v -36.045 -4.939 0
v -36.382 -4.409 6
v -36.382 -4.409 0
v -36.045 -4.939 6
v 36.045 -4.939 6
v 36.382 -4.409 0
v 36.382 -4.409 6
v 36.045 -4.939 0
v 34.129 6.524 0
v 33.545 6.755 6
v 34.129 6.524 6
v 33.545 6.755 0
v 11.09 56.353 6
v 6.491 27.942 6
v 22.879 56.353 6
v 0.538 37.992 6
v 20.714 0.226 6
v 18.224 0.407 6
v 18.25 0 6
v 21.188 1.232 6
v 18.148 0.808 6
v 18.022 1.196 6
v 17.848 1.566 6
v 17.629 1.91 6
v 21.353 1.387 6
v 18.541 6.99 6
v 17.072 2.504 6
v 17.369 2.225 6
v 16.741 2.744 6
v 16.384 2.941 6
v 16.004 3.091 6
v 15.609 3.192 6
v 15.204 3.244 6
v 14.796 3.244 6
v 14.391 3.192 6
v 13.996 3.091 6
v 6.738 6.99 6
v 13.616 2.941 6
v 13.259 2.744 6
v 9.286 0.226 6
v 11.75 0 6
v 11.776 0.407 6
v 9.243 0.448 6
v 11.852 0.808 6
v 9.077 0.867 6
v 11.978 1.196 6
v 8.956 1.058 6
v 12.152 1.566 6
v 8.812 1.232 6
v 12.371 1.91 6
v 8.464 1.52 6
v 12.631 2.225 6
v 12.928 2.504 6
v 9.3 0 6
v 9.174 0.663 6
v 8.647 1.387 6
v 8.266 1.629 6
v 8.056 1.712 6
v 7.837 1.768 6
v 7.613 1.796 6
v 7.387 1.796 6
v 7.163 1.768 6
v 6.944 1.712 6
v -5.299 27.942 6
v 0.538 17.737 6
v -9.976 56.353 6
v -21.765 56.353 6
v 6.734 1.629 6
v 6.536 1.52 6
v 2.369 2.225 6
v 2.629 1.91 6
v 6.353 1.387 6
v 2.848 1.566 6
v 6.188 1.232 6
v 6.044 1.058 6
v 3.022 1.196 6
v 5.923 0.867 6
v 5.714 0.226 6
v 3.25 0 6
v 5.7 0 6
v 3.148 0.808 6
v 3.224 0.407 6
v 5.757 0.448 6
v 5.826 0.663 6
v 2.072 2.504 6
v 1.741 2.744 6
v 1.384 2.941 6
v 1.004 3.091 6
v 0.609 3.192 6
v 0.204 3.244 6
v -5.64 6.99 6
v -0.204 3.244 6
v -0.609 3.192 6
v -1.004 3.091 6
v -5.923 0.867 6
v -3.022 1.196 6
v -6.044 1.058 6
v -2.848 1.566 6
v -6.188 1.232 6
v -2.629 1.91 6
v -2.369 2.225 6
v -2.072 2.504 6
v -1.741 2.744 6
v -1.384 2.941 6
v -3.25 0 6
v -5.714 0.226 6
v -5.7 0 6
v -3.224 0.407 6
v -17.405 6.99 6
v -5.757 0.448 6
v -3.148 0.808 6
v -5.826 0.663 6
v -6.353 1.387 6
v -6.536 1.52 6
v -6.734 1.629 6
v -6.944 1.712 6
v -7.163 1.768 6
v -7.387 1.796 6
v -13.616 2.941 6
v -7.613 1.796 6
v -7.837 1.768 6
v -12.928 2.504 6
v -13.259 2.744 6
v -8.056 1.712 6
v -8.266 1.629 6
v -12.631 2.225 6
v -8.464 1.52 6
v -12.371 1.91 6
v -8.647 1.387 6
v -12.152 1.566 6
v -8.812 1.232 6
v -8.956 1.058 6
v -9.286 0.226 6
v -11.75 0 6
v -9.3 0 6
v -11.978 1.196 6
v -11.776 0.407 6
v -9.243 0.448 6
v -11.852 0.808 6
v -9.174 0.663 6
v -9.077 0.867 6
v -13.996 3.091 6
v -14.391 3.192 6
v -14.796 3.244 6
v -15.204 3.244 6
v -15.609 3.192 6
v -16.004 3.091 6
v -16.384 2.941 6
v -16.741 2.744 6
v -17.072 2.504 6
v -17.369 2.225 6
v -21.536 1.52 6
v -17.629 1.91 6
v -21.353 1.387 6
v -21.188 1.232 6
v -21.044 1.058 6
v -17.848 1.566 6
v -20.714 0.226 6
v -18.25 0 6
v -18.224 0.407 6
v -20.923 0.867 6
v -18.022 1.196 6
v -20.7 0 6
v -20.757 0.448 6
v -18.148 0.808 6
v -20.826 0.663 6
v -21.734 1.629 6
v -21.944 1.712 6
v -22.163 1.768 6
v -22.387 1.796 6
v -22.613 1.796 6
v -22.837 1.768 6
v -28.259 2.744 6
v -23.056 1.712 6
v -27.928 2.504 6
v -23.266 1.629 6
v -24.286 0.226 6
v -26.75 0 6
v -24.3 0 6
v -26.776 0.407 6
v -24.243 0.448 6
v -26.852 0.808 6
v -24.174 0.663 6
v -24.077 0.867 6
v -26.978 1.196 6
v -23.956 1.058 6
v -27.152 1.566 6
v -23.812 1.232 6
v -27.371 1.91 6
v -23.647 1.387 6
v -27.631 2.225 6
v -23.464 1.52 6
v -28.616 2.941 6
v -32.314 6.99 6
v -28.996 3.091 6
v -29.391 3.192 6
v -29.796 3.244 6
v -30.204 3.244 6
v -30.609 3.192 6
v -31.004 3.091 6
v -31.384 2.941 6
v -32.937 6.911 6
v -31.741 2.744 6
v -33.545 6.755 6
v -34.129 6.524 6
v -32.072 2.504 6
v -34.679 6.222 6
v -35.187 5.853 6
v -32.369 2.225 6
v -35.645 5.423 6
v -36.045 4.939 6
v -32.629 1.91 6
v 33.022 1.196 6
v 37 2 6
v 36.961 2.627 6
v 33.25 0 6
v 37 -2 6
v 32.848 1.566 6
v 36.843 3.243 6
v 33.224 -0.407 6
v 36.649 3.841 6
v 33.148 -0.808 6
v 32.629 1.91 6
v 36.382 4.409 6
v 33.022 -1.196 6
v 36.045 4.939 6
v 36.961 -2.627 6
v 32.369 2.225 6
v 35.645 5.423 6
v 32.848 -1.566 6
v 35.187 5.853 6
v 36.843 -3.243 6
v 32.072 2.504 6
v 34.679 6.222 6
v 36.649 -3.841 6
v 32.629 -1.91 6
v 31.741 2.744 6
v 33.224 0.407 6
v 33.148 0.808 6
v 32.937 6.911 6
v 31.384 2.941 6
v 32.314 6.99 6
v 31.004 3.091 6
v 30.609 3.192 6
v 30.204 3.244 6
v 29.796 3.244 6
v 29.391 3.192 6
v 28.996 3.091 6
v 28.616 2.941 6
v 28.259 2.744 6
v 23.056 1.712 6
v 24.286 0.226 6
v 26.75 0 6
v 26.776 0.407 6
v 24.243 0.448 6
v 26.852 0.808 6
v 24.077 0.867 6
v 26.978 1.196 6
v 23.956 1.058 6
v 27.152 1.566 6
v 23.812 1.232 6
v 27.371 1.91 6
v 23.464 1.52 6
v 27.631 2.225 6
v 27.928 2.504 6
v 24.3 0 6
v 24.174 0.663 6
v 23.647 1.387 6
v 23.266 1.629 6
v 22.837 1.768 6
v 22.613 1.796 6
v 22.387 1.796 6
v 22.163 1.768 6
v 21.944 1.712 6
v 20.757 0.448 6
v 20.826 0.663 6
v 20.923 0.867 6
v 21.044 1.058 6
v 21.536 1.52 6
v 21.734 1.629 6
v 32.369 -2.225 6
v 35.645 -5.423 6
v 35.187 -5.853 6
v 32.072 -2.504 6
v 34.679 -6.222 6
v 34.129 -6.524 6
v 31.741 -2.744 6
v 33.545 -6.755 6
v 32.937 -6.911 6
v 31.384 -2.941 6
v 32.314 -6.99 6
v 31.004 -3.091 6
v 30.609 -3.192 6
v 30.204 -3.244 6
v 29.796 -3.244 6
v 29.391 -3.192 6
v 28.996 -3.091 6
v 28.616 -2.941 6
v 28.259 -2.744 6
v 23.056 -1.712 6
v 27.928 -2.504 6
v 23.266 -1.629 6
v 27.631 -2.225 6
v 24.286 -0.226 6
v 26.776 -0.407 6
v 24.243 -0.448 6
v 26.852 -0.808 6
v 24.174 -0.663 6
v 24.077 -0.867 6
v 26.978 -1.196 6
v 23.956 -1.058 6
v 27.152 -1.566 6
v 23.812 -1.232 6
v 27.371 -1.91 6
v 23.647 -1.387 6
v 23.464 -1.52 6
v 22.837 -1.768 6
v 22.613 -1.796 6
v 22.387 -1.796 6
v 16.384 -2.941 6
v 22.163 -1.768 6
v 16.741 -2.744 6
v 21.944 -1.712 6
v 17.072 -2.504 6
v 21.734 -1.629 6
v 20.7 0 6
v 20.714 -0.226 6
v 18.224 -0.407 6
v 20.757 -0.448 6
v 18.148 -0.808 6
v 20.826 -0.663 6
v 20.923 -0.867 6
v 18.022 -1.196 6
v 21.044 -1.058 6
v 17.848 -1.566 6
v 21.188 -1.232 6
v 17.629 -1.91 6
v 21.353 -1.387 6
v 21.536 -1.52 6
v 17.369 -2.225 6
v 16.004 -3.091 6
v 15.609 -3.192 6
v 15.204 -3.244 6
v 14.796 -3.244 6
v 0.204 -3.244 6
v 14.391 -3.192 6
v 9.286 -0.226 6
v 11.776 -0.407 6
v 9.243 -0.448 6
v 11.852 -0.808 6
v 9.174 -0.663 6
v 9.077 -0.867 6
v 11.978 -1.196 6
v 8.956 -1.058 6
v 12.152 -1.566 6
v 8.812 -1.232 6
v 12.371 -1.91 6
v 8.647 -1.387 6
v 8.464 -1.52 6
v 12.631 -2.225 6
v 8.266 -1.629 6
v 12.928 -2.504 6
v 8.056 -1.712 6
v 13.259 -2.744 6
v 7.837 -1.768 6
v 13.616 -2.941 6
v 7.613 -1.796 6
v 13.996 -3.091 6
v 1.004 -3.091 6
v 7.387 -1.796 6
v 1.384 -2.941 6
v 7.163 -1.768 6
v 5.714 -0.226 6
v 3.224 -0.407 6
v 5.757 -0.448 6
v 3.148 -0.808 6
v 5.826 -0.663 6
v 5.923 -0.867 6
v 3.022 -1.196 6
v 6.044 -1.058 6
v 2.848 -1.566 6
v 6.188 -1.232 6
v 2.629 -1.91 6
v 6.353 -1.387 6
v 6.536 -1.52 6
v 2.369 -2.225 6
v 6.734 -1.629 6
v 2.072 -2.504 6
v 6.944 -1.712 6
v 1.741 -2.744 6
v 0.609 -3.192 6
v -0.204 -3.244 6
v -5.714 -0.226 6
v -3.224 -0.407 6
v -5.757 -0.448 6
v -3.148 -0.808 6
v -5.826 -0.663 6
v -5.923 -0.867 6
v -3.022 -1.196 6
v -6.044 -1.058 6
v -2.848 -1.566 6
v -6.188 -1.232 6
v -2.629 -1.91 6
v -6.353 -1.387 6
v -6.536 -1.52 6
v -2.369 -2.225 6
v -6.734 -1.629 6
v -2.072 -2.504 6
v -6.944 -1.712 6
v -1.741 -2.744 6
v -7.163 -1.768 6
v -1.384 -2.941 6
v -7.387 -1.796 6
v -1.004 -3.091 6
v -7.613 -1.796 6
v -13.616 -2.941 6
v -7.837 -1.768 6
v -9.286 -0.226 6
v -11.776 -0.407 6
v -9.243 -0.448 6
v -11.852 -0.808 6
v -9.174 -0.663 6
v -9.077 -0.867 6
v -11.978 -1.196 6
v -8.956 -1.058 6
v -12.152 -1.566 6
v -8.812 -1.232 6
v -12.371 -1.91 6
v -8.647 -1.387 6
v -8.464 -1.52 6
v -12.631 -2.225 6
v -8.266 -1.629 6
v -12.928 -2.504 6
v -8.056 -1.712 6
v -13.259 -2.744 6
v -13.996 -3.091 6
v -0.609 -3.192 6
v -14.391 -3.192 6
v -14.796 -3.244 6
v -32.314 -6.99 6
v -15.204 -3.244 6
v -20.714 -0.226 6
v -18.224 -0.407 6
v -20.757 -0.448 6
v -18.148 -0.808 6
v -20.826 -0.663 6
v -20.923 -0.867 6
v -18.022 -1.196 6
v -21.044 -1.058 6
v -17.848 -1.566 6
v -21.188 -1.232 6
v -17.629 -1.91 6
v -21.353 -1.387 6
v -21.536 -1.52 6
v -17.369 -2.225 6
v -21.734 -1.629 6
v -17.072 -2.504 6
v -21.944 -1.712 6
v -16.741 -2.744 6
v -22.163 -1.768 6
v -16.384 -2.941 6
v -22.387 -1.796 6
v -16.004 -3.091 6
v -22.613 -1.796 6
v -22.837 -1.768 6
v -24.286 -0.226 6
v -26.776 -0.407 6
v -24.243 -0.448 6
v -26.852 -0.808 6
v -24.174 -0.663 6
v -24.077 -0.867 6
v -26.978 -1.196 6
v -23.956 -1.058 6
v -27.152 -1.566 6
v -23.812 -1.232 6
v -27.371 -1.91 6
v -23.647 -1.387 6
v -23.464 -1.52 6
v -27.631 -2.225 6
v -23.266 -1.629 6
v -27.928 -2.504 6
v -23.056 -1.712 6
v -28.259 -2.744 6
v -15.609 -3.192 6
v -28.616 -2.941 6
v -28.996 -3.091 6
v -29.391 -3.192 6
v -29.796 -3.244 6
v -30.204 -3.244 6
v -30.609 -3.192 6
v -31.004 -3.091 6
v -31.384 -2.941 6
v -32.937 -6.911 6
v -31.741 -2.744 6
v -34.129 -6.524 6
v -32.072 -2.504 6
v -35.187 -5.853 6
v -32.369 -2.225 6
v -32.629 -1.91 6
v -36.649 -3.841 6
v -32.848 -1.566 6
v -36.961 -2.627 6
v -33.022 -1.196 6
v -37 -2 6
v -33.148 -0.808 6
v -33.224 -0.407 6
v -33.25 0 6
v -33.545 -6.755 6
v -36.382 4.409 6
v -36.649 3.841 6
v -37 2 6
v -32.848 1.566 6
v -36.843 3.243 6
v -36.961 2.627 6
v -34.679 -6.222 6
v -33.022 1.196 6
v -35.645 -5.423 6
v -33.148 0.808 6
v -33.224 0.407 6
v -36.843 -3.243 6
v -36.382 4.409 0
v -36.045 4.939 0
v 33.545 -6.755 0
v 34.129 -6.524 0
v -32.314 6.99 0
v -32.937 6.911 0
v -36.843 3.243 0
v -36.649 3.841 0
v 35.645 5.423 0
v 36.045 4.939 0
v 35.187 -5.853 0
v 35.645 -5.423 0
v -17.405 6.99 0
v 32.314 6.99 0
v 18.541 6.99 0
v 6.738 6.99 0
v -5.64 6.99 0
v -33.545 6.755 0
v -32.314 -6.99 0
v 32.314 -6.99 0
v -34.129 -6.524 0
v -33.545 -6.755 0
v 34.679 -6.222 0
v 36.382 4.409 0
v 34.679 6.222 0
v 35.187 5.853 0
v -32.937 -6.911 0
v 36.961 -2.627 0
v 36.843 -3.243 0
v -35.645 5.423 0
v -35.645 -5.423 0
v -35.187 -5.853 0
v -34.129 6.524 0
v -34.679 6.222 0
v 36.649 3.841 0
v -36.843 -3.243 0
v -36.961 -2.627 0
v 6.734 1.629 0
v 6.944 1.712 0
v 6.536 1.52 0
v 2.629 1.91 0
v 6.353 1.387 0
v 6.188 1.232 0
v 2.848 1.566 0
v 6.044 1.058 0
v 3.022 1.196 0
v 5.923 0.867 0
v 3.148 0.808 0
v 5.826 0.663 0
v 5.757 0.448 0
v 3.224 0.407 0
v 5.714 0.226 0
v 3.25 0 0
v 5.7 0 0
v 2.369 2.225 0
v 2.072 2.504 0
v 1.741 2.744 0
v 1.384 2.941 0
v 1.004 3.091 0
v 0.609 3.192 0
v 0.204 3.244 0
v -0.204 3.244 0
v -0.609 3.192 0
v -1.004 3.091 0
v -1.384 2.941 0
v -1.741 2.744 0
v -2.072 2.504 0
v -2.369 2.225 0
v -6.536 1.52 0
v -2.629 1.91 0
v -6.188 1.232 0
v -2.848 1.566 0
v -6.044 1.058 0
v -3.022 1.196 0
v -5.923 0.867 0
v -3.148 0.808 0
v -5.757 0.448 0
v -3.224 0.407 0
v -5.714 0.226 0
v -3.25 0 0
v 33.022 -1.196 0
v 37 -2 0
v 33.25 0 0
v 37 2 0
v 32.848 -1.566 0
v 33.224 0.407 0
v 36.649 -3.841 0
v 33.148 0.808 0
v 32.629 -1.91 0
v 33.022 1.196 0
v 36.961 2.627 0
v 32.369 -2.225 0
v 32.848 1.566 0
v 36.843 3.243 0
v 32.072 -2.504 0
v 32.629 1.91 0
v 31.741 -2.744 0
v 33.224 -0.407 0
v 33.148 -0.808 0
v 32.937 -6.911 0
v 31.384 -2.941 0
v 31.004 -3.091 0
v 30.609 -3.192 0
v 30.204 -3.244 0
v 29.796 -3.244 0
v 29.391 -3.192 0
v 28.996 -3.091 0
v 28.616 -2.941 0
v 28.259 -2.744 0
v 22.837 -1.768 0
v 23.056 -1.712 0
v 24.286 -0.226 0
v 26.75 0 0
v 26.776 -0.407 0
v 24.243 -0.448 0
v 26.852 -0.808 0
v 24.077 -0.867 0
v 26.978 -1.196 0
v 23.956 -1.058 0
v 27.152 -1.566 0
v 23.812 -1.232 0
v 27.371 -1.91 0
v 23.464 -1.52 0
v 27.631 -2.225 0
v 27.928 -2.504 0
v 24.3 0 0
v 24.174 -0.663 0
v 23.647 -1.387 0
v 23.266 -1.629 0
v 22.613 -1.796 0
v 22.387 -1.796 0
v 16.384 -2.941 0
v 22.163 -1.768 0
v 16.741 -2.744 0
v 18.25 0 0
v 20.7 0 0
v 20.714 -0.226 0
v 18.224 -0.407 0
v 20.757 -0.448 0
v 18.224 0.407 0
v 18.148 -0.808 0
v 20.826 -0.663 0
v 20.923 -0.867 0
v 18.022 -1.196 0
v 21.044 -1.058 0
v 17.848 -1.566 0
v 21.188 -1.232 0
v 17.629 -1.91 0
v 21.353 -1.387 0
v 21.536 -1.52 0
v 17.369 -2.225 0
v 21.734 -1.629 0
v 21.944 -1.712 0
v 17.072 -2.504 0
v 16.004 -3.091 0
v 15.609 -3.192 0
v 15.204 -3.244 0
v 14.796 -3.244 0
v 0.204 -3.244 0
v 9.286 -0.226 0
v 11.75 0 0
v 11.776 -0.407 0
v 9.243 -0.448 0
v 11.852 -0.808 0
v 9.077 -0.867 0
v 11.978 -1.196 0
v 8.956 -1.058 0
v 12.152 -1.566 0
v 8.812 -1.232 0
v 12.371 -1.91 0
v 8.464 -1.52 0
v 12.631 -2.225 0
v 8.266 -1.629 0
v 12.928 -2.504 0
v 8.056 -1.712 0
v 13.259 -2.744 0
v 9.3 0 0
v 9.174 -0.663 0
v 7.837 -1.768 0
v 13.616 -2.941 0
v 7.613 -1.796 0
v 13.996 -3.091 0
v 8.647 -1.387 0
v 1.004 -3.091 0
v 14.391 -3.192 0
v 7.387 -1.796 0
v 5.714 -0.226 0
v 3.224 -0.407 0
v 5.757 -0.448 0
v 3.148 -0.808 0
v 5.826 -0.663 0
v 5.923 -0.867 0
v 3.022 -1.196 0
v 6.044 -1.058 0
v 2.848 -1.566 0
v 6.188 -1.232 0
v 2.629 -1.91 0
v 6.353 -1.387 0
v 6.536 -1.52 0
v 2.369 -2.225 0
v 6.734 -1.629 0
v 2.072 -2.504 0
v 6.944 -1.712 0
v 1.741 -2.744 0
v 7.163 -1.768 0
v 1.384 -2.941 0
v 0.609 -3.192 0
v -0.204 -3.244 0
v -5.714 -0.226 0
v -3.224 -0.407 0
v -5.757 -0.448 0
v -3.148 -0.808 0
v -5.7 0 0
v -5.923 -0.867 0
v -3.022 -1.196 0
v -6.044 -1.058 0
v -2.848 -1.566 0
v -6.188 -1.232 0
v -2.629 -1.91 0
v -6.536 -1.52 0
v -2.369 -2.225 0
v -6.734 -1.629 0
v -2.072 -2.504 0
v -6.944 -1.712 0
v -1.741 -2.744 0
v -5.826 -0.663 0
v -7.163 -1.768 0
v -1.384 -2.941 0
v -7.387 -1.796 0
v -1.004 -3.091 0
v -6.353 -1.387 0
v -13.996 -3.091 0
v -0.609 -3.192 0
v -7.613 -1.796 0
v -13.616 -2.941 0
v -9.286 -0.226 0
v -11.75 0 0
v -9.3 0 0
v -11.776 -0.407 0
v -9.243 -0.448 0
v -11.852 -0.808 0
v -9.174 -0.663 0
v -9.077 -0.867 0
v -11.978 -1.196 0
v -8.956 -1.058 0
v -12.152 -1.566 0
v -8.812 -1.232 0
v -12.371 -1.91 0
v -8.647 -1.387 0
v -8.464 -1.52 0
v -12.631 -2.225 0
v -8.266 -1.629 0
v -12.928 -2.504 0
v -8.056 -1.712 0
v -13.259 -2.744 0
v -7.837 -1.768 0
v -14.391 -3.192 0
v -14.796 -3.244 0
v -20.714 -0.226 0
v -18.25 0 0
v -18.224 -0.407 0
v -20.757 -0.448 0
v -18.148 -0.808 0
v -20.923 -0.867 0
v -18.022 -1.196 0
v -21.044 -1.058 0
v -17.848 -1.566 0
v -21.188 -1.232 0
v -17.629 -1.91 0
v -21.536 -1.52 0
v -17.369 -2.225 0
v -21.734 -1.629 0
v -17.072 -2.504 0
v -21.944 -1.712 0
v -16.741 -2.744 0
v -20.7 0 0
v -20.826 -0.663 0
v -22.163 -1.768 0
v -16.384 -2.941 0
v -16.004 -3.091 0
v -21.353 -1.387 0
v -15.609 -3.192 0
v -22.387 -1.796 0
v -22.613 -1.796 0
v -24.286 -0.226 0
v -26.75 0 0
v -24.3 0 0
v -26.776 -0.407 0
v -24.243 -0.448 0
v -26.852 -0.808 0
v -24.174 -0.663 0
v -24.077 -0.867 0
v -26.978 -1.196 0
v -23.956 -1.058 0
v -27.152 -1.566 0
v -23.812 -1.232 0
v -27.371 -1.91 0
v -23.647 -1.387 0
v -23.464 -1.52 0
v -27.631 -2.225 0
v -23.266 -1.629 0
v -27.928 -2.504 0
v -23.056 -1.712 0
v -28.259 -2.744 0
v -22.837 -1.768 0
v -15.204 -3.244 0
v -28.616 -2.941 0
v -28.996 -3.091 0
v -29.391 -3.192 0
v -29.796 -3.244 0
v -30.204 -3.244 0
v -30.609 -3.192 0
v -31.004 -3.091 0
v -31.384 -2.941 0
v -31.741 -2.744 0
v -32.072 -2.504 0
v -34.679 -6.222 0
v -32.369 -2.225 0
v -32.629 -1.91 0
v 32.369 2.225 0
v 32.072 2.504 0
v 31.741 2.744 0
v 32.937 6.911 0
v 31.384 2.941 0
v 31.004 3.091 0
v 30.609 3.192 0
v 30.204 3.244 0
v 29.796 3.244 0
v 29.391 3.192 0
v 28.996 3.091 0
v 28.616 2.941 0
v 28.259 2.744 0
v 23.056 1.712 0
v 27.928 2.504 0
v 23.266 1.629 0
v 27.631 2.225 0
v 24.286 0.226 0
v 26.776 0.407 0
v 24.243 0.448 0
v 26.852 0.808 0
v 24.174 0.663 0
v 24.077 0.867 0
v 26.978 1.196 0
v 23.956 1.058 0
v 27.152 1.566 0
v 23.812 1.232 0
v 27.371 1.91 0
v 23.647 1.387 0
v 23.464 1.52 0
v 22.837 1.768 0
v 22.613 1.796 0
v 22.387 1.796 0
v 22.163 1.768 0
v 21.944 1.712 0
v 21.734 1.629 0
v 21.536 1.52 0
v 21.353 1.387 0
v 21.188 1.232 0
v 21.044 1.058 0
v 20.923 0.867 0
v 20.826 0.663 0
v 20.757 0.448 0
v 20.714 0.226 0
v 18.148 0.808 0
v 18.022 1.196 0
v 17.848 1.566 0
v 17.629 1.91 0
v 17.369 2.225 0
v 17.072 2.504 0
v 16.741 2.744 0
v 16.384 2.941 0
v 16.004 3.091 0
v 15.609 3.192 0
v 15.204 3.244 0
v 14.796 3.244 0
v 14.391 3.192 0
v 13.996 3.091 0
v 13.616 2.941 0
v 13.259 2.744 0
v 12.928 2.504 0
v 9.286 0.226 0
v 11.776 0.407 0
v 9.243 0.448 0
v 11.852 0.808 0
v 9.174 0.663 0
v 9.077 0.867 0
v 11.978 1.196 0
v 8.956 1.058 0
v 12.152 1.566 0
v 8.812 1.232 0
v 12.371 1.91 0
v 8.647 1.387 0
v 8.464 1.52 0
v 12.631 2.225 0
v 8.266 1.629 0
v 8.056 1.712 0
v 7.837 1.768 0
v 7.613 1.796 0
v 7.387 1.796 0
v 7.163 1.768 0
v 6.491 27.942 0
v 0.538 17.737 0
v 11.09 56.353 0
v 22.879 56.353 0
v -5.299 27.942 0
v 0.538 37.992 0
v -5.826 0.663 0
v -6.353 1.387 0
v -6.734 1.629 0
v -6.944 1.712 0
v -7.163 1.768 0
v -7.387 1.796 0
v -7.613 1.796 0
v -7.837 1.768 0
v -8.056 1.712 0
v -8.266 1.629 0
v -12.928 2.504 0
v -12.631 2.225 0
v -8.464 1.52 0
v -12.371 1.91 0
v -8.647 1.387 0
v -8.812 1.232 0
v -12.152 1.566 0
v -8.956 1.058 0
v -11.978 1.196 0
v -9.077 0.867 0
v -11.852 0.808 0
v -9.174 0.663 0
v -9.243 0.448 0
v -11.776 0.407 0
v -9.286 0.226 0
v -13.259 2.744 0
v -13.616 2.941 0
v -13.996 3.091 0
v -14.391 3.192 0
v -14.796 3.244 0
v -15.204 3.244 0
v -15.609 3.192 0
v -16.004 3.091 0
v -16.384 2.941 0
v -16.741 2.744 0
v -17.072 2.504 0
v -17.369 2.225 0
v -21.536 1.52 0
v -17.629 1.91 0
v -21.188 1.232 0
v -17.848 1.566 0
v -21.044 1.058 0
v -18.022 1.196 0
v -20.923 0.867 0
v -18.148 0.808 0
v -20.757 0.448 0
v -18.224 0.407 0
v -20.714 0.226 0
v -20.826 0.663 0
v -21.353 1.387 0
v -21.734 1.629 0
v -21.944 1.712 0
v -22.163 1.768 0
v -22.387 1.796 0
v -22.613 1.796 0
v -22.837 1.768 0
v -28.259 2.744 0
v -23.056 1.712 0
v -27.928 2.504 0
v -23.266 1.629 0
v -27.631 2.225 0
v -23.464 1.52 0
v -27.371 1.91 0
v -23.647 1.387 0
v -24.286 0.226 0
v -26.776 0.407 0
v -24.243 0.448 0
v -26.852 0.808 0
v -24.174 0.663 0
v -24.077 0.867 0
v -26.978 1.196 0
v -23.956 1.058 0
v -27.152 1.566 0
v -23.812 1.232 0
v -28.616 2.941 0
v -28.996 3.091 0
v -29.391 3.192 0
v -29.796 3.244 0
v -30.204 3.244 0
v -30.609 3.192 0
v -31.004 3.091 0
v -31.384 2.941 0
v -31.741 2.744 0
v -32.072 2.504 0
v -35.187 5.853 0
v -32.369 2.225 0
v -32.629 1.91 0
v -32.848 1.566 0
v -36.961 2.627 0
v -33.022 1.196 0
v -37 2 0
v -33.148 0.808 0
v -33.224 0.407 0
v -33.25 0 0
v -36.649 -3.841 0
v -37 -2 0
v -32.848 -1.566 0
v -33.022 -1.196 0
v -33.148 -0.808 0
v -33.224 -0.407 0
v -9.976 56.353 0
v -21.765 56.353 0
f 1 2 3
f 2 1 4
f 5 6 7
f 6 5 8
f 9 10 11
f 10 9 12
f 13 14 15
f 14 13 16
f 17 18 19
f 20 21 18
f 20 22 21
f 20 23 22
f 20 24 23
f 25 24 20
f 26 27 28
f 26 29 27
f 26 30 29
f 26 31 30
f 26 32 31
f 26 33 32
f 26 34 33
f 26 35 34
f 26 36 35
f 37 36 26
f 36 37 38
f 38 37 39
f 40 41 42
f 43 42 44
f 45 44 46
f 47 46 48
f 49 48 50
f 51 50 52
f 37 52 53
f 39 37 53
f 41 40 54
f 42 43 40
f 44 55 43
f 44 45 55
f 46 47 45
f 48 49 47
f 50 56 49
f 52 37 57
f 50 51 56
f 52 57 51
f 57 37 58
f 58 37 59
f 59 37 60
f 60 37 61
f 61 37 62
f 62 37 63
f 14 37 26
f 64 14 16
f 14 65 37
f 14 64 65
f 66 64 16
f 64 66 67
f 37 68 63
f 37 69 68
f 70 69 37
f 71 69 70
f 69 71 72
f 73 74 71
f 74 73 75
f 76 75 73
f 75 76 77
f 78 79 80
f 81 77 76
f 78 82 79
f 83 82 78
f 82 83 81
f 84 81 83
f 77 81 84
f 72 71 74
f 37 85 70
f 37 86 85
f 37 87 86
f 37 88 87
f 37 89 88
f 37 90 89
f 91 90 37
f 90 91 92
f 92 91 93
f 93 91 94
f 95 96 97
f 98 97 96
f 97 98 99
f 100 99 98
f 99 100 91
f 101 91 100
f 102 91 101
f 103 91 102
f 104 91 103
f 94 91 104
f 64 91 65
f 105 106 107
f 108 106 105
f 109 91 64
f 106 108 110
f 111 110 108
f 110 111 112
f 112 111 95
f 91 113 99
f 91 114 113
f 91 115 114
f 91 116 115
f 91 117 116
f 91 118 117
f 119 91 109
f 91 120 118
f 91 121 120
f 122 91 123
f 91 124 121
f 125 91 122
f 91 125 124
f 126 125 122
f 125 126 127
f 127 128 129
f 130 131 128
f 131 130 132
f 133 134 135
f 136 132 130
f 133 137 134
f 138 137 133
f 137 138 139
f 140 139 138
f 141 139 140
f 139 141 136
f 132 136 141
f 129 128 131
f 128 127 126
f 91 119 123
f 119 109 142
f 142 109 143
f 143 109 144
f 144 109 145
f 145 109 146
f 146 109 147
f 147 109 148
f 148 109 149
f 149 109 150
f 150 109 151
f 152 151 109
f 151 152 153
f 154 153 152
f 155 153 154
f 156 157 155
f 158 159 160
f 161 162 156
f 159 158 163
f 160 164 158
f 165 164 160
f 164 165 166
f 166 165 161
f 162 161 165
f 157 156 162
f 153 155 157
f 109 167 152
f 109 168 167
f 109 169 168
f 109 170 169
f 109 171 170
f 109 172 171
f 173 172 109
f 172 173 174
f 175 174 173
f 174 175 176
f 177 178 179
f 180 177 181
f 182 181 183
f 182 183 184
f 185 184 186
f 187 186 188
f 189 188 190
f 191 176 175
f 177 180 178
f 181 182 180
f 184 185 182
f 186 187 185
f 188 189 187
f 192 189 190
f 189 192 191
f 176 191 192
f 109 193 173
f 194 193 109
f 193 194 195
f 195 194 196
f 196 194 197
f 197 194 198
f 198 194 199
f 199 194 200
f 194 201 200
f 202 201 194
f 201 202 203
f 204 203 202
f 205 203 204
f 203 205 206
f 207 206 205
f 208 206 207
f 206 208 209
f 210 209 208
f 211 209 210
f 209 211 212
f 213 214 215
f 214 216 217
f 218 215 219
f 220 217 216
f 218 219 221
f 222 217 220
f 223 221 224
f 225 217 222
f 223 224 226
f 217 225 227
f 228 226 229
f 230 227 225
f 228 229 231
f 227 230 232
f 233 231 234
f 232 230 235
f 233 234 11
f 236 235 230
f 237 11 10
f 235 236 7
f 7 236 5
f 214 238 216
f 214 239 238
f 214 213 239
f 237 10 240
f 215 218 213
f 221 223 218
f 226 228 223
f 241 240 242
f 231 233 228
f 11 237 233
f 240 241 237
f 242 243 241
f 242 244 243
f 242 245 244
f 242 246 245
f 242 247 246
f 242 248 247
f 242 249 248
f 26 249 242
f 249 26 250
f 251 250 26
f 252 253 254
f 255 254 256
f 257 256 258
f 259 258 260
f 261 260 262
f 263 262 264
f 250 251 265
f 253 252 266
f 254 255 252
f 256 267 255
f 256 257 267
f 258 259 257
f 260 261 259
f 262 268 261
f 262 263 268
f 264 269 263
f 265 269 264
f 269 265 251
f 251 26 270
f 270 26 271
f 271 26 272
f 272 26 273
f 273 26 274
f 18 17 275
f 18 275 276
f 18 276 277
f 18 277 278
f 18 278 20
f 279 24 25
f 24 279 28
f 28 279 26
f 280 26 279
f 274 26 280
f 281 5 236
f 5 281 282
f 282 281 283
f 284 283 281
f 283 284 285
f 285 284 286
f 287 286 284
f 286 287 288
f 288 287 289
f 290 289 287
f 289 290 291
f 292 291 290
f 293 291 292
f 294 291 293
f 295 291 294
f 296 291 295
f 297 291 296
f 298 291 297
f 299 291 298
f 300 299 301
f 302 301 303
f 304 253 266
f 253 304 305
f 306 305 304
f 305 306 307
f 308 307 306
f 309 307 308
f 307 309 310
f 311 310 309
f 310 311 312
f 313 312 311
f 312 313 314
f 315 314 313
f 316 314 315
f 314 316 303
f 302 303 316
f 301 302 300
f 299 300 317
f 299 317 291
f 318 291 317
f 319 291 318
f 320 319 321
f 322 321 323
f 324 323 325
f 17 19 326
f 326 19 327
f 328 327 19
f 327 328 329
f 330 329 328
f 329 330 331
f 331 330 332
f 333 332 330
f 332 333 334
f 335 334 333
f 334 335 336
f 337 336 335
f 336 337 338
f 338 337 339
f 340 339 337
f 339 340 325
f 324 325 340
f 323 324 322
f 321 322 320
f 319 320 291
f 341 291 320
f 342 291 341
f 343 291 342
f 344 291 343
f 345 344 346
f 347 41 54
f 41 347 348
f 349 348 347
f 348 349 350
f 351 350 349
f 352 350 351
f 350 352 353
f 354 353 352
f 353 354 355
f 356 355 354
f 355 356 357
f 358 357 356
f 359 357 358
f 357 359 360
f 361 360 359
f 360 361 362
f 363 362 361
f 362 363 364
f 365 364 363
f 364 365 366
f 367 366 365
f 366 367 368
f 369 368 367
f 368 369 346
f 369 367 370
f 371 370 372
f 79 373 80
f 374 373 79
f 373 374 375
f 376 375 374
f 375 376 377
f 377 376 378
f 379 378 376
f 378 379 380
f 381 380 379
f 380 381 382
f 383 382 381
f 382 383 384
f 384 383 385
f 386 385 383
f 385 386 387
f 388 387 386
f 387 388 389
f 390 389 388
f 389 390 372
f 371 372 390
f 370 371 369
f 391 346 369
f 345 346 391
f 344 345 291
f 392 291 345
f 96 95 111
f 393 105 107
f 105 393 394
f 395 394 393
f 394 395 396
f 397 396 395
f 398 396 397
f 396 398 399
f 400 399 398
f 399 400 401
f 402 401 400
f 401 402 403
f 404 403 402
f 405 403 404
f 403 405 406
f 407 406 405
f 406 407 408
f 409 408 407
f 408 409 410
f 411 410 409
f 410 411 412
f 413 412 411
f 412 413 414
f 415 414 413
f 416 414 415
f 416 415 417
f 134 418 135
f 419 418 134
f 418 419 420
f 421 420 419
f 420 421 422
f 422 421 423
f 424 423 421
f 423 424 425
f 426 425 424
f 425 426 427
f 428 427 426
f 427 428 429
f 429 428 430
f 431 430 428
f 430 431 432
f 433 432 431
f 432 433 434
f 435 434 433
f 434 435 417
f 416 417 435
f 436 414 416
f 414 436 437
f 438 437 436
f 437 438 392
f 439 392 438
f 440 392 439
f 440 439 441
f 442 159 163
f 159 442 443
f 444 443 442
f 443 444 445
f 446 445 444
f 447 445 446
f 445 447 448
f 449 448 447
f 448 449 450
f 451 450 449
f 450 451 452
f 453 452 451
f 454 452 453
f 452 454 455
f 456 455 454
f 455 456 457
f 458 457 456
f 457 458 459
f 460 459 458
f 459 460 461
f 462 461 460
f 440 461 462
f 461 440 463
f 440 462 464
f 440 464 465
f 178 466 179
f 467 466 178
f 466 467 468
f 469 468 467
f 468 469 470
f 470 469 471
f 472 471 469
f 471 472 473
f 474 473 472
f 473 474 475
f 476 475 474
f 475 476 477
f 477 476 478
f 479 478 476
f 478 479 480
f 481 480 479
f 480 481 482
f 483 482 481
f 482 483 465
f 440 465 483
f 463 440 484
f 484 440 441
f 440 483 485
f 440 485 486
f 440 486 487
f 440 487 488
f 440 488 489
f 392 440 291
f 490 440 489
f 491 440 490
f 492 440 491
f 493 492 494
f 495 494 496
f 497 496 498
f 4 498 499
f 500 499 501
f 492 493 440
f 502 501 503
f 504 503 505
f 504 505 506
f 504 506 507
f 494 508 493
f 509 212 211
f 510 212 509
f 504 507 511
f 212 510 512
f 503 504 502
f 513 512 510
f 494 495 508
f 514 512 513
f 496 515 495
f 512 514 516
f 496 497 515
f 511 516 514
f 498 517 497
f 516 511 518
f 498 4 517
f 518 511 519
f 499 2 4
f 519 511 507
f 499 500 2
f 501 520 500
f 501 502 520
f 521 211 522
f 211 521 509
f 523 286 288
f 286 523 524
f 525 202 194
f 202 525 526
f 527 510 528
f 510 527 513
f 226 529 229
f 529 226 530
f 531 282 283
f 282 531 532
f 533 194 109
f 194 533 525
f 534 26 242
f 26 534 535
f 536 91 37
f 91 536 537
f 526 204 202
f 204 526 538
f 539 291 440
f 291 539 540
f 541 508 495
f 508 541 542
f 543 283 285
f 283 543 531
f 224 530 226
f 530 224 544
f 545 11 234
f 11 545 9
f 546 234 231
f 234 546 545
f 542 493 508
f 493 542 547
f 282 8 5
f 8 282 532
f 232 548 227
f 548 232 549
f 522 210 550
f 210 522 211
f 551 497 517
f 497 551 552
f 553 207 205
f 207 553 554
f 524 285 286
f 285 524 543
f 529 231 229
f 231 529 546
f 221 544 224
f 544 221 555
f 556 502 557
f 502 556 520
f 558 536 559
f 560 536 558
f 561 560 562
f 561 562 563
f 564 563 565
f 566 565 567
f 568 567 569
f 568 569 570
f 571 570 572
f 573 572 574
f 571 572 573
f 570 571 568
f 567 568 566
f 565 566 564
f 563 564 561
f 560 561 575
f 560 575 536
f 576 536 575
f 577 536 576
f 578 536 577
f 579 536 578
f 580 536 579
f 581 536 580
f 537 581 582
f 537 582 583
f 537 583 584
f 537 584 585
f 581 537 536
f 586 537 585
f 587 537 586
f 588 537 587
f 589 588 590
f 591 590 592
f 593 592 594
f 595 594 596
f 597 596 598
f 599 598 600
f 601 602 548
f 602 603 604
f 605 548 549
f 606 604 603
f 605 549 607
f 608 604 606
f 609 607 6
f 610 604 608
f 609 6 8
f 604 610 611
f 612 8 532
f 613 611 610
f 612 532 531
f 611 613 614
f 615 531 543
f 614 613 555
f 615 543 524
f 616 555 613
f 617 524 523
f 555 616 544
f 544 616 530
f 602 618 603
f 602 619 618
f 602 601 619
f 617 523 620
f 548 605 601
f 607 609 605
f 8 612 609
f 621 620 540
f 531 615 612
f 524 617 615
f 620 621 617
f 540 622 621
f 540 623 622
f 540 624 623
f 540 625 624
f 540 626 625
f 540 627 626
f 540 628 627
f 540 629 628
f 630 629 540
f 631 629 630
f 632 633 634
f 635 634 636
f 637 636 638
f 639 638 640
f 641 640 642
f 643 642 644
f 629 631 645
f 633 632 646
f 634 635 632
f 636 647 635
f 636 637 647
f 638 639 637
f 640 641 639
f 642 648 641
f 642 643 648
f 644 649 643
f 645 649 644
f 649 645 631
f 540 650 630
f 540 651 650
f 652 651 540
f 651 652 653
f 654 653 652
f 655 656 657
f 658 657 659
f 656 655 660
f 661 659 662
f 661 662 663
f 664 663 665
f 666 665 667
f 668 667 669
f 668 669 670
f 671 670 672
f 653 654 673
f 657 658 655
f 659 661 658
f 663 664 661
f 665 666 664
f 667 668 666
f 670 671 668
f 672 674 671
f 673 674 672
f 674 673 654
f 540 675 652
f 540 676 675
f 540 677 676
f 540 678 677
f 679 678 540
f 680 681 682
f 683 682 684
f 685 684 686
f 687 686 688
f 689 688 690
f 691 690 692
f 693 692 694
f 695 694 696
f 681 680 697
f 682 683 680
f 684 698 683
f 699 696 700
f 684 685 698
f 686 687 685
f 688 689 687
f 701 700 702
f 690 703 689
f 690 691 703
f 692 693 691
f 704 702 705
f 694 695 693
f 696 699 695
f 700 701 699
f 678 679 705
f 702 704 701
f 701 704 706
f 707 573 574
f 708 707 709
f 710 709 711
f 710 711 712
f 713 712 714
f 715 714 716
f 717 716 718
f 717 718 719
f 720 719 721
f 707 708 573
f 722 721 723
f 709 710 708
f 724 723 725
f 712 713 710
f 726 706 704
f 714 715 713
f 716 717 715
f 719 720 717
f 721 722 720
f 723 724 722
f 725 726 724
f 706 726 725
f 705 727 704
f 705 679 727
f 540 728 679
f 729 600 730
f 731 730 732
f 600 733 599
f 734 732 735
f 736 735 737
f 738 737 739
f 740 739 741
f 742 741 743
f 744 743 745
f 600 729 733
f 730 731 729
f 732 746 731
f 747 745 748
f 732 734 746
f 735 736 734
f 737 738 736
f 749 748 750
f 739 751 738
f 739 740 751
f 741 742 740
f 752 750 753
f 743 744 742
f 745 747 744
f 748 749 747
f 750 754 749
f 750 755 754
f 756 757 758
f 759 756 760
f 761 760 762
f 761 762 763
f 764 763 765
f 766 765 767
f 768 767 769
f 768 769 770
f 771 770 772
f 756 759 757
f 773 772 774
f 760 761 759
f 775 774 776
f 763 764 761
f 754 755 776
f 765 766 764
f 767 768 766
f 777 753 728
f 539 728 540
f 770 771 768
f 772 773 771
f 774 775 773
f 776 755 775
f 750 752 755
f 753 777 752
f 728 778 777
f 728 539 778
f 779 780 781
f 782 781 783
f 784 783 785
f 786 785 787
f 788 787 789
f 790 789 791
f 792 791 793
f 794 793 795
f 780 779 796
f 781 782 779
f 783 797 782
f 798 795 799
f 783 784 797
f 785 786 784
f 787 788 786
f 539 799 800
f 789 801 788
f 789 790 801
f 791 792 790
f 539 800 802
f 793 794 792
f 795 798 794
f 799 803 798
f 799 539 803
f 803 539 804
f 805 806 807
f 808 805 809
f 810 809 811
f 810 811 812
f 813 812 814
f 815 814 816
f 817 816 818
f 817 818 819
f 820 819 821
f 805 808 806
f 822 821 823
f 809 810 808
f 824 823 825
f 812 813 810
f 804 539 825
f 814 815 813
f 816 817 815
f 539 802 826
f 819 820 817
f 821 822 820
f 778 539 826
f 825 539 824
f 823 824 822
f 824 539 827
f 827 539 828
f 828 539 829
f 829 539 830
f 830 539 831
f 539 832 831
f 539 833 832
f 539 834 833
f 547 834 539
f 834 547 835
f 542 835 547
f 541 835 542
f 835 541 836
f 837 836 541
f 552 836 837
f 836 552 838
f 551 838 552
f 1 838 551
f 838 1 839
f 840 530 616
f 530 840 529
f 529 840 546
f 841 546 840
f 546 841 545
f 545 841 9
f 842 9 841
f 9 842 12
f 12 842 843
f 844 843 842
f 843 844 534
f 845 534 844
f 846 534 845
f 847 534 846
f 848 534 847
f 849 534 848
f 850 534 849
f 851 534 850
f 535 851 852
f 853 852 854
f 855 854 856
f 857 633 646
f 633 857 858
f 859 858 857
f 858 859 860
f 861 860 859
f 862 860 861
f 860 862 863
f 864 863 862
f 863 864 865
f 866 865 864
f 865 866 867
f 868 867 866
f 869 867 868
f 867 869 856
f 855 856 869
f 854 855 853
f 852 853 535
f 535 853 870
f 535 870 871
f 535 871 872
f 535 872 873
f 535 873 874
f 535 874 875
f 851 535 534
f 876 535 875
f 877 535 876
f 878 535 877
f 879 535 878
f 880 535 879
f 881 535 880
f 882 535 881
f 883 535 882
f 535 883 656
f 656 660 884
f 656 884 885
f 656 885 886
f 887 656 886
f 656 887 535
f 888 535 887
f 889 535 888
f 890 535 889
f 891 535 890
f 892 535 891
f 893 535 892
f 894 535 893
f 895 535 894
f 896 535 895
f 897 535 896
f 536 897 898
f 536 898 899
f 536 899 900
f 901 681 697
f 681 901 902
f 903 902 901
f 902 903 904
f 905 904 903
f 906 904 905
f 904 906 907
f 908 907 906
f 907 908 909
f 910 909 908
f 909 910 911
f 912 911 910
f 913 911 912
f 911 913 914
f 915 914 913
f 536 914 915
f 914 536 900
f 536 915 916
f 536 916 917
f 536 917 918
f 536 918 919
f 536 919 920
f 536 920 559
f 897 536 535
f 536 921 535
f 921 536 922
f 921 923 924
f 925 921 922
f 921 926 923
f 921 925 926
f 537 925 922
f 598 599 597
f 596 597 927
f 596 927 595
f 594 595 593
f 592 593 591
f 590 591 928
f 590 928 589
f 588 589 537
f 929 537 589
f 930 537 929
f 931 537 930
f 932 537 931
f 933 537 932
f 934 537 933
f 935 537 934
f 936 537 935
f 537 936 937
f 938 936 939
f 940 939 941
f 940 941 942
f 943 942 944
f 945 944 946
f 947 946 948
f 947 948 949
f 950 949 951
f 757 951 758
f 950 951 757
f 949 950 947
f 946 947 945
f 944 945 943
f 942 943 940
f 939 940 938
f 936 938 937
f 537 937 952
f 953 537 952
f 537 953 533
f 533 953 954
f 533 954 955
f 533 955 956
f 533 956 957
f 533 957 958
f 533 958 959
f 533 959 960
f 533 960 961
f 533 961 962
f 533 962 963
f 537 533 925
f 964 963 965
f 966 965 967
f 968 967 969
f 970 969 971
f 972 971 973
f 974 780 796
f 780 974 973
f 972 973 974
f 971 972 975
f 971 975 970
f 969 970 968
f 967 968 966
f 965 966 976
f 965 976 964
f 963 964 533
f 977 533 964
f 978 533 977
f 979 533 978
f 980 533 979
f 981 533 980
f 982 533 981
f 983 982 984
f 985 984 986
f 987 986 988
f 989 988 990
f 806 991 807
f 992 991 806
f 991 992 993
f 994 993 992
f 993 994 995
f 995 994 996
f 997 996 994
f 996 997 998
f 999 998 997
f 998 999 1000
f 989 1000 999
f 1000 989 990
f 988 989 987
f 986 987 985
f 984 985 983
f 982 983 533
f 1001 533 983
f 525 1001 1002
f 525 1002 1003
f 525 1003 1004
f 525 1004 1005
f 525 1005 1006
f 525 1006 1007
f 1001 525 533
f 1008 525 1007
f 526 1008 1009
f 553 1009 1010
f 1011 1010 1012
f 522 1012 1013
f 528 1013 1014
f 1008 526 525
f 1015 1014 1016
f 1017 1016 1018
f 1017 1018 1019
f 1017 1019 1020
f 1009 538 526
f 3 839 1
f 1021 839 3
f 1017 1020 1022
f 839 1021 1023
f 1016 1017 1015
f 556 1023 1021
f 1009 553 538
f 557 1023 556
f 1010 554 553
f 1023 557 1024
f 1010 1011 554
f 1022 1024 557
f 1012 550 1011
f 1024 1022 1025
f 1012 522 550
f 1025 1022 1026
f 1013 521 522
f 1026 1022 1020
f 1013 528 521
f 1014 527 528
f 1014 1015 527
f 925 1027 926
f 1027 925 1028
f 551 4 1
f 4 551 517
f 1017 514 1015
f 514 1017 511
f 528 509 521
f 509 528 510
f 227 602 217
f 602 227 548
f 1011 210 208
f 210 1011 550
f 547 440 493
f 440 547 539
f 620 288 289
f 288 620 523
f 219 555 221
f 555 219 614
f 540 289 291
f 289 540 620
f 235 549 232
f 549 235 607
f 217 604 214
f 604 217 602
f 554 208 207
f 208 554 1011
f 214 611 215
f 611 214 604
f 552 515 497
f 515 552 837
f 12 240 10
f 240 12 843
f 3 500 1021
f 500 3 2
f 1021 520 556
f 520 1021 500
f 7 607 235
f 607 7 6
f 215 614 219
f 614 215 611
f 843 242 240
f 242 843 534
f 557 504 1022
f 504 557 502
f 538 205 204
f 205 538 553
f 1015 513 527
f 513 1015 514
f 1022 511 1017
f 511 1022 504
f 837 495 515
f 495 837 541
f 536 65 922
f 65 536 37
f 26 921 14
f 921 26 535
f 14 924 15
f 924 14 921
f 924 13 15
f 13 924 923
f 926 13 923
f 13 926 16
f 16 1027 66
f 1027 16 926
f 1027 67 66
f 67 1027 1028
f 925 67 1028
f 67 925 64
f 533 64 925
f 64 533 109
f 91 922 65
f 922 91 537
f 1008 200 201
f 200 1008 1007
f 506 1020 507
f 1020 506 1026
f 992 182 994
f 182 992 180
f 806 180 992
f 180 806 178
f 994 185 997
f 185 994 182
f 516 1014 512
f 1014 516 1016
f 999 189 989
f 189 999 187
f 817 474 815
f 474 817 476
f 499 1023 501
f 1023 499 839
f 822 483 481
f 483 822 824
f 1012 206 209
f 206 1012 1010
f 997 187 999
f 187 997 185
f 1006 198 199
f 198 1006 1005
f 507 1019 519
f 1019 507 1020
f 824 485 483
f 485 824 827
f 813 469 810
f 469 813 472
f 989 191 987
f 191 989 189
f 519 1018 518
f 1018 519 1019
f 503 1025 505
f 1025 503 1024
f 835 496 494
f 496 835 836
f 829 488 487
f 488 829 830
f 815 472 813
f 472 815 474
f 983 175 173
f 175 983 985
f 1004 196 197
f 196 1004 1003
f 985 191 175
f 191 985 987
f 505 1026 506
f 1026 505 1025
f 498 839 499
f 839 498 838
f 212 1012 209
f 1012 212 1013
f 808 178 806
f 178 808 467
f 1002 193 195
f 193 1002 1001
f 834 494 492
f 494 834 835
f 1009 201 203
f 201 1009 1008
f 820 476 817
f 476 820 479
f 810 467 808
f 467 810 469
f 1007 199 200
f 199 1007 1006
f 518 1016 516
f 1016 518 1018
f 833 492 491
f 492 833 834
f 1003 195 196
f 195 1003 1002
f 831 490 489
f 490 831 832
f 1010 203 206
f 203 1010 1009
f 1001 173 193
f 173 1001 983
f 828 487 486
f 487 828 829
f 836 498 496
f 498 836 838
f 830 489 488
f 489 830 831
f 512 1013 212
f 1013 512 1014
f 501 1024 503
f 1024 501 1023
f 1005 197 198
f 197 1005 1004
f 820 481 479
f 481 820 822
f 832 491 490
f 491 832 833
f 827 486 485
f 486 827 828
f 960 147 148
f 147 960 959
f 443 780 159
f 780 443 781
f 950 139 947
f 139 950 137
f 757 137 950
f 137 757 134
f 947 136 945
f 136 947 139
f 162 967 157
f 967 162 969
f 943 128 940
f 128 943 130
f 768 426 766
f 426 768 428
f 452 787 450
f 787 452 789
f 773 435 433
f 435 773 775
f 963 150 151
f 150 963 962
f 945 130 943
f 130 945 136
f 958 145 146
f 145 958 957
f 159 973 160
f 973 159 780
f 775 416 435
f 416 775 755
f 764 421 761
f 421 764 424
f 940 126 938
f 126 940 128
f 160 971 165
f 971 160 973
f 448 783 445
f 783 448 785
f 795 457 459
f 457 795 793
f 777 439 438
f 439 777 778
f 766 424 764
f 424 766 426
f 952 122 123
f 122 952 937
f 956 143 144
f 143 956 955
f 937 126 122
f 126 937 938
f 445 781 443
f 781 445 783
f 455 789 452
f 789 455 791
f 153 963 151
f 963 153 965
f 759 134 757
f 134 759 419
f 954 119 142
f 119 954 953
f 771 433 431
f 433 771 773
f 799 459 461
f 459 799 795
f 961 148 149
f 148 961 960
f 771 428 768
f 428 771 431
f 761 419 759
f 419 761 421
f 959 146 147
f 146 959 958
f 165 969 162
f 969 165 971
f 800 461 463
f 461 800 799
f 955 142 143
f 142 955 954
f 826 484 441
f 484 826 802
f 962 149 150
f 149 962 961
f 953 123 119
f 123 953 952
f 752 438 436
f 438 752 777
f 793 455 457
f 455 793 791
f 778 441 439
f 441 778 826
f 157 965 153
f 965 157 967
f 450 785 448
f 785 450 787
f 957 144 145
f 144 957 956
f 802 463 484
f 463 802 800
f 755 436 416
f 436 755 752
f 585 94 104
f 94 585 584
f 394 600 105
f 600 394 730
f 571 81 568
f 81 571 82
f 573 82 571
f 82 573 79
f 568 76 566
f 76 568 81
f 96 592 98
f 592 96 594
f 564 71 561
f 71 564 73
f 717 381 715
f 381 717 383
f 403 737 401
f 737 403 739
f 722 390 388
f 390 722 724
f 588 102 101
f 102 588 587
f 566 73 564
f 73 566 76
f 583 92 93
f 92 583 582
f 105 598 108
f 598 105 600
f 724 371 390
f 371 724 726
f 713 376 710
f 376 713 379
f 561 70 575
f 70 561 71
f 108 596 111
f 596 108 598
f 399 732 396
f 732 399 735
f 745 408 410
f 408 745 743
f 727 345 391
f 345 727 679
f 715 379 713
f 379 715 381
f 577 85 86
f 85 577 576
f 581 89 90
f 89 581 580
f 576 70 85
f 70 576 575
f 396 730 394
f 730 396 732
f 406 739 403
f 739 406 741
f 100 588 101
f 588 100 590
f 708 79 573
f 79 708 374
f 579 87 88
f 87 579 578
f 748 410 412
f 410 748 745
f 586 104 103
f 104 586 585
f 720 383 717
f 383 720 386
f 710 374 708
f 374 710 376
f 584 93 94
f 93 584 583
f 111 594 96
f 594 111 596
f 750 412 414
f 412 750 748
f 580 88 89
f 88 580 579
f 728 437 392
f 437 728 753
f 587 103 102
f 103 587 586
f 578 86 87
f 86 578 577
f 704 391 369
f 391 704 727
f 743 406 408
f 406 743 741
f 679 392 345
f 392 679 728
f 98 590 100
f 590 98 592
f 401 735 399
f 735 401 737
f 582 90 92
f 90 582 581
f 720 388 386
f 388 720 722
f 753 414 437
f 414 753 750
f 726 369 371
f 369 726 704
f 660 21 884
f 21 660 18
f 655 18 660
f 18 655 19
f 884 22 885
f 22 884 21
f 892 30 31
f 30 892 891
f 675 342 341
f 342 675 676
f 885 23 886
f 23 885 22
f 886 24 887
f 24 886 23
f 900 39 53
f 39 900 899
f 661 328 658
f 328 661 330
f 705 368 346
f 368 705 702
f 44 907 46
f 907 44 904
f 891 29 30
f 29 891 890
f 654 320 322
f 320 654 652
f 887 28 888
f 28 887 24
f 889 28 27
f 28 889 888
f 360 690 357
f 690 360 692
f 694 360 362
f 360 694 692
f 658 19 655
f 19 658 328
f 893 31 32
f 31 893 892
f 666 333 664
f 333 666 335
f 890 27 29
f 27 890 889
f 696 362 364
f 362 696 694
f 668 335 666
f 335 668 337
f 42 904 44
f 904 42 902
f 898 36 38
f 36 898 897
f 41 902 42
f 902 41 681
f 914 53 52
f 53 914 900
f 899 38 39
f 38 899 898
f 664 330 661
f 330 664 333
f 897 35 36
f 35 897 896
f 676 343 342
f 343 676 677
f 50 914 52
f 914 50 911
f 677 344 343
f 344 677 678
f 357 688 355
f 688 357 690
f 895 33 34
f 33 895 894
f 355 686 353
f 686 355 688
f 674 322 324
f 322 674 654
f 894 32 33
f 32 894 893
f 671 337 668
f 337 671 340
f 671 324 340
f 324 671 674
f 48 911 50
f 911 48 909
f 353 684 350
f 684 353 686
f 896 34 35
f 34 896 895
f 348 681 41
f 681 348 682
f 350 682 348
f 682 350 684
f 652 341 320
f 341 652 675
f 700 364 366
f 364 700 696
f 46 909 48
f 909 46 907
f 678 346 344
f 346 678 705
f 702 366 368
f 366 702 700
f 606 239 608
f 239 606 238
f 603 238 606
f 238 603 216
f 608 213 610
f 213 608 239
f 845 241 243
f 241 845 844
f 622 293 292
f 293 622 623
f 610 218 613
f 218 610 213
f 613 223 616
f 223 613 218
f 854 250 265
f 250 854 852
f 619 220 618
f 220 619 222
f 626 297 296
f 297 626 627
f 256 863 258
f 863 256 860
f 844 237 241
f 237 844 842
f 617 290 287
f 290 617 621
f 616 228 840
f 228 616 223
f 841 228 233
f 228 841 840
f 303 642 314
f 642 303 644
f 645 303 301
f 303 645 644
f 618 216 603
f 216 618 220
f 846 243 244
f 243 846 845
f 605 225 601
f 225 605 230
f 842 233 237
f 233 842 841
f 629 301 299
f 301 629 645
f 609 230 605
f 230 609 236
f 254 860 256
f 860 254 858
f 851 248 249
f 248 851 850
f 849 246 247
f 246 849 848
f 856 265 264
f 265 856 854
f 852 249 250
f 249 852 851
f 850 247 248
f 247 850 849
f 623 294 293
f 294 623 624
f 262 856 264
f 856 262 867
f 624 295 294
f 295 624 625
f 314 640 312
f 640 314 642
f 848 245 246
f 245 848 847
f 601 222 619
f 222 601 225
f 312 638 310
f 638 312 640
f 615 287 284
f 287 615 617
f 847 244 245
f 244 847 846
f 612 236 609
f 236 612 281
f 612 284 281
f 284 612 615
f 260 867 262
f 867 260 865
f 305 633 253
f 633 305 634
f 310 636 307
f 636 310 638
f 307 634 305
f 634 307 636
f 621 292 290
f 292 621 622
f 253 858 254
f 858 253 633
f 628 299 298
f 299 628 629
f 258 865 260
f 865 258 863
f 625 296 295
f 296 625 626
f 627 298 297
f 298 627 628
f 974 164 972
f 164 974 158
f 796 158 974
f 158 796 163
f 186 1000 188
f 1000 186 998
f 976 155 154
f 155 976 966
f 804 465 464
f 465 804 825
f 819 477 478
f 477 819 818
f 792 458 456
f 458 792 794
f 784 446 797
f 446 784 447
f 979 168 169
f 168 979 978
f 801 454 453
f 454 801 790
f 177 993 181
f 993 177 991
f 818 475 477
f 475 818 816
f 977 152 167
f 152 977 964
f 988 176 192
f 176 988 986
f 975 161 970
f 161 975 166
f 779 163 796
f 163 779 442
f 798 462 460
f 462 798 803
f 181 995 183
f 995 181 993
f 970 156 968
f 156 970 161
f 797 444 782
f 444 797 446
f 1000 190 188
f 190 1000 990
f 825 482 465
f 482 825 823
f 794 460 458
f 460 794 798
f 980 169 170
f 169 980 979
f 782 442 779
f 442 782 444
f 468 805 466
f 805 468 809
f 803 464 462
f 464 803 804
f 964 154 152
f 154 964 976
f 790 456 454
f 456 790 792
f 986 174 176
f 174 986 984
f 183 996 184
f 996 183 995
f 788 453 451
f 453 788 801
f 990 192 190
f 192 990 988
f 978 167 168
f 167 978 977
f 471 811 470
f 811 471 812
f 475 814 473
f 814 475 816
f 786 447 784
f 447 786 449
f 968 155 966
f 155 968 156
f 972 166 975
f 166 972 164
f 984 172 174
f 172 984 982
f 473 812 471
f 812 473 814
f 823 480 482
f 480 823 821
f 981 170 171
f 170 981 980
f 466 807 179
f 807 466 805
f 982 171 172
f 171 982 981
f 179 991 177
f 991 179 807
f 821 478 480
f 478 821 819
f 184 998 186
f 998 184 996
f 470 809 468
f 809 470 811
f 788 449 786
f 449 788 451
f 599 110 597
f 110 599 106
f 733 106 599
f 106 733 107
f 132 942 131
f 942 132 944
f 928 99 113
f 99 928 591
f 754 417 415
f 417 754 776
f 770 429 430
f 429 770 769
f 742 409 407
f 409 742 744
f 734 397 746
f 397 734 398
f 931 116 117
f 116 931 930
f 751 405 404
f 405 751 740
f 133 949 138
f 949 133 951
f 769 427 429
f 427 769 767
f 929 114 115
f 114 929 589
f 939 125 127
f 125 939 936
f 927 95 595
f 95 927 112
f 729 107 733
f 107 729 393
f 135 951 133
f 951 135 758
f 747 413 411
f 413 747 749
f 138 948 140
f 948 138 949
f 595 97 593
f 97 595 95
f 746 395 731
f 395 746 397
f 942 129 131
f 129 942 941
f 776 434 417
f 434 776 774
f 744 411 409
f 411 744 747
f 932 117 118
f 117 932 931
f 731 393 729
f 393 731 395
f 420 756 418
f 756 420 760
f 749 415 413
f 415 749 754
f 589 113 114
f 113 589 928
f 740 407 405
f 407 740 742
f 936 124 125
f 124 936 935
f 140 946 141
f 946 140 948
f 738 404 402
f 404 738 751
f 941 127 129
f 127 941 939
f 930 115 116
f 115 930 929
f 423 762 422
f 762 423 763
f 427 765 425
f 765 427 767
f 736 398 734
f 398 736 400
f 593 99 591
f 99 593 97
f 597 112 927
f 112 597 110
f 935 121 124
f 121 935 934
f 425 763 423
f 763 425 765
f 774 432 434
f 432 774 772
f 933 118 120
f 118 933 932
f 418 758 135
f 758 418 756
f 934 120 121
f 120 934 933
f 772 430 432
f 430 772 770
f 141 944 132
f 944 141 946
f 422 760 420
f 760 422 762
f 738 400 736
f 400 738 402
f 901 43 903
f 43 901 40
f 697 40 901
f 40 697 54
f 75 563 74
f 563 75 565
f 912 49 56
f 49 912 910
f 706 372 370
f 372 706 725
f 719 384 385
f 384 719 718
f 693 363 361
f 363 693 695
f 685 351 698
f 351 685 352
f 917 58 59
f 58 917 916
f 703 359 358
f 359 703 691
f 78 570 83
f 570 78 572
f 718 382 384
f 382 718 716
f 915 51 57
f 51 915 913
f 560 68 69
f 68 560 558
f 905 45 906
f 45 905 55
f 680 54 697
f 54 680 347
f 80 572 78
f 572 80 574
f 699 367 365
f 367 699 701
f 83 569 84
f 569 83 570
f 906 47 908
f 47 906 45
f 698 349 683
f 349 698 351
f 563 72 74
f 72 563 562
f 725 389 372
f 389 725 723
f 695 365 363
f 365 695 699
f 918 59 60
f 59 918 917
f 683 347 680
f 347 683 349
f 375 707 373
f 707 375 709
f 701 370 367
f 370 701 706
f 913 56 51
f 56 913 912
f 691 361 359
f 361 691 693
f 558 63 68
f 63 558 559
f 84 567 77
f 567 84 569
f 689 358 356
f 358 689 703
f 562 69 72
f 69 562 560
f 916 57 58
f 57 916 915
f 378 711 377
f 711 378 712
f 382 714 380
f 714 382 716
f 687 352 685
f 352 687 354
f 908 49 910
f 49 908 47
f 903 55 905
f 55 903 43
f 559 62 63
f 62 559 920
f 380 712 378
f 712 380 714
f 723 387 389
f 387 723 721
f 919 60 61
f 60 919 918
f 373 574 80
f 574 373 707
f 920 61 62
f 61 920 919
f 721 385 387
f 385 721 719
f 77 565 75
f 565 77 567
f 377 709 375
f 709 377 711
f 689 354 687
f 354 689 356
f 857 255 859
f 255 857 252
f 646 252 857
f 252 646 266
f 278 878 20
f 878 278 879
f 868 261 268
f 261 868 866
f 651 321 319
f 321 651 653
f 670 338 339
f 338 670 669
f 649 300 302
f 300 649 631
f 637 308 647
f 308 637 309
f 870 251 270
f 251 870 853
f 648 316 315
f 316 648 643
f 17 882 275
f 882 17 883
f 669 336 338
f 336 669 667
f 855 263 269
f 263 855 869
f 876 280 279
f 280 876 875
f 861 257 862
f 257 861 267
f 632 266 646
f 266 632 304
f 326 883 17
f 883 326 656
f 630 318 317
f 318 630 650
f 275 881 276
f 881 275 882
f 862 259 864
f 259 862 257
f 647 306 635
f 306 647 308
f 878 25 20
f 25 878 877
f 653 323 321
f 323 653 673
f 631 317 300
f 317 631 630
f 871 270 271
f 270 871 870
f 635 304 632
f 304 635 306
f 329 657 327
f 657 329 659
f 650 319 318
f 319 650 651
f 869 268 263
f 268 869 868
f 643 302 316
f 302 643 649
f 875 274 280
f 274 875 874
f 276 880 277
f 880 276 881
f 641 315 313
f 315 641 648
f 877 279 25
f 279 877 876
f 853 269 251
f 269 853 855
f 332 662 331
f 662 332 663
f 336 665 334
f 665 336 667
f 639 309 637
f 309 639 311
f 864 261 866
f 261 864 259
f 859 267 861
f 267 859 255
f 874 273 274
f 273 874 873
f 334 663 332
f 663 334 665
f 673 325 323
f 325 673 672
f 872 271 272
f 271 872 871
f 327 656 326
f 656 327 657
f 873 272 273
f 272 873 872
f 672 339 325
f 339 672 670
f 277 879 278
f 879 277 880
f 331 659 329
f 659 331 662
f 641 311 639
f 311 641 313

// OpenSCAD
$fn = 50;


difference() {
	union() {
		hull() {
			translate(v = [-32.0000000000, 2.0000000000, 0]) {
				cylinder(h = 6, r = 5);
			}
			translate(v = [32.0000000000, 2.0000000000, 0]) {
				cylinder(h = 6, r = 5);
			}
			translate(v = [-32.0000000000, -2.0000000000, 0]) {
				cylinder(h = 6, r = 5);
			}
			translate(v = [32.0000000000, -2.0000000000, 0]) {
				cylinder(h = 6, r = 5);
			}
		}
		translate(v = [0, 55, 0]) {
			linear_extrude(height = 6) {
				text(font = "DejaVu Sans Mono:style=Bold", halign = "center", size = 57.0000000000, text = "X", valign = "top");
			}
		}
	}
	union() {
		translate(v = [-30.0000000000, 0.0000000000, 0]) {
			translate(v = [0, 0, -100]) {
				cylinder(h = 200, r = 3.2500000000);
			}
		}
		translate(v = [-15.0000000000, 0.0000000000, 0]) {
			translate(v = [0, 0, -100]) {
				cylinder(h = 200, r = 3.2500000000);
			}
		}
		translate(v = [0, 0, -100]) {
			cylinder(h = 200, r = 3.2500000000);
		}
		translate(v = [15.0000000000, 0.0000000000, 0]) {
			translate(v = [0, 0, -100]) {
				cylinder(h = 200, r = 3.2500000000);
			}
		}
		translate(v = [30.0000000000, 0.0000000000, 0]) {
			translate(v = [0, 0, -100]) {
				cylinder(h = 200, r = 3.2500000000);
			}
		}
		translate(v = [-30.0000000000, 0.0000000000, 0]) {
			translate(v = [0, 0, -100]) {
				cylinder(h = 200, r = 1.8000000000);
			}
		}
		translate(v = [-22.5000000000, 0.0000000000, 0]) {
			translate(v = [0, 0, -100]) {
				cylinder(h = 200, r = 1.8000000000);
			}
		}
		translate(v = [-15.0000000000, 0.0000000000, 0]) {
			translate(v = [0, 0, -100]) {
				cylinder(h = 200, r = 1.8000000000);
			}
		}
		translate(v = [-7.5000000000, 0.0000000000, 0]) {
			translate(v = [0, 0, -100]) {
				cylinder(h = 200, r = 1.8000000000);
			}
		}
		translate(v = [0, 0, -100]) {
			cylinder(h = 200, r = 1.8000000000);
		}
		translate(v = [7.5000000000, 0.0000000000, 0]) {
			translate(v = [0, 0, -100]) {
				cylinder(h = 200, r = 1.8000000000);
			}
		}
		translate(v = [15.0000000000, 0.0000000000, 0]) {
			translate(v = [0, 0, -100]) {
				cylinder(h = 200, r = 1.8000000000);
			}
		}
		translate(v = [22.5000000000, 0.0000000000, 0]) {
			translate(v = [0, 0, -100]) {
				cylinder(h = 200, r = 1.8000000000);
			}
		}
		translate(v = [30.0000000000, 0.0000000000, 0]) {
			translate(v = [0, 0, -100]) {
				cylinder(h = 200, r = 1.8000000000);
			}
		}
	}
}
